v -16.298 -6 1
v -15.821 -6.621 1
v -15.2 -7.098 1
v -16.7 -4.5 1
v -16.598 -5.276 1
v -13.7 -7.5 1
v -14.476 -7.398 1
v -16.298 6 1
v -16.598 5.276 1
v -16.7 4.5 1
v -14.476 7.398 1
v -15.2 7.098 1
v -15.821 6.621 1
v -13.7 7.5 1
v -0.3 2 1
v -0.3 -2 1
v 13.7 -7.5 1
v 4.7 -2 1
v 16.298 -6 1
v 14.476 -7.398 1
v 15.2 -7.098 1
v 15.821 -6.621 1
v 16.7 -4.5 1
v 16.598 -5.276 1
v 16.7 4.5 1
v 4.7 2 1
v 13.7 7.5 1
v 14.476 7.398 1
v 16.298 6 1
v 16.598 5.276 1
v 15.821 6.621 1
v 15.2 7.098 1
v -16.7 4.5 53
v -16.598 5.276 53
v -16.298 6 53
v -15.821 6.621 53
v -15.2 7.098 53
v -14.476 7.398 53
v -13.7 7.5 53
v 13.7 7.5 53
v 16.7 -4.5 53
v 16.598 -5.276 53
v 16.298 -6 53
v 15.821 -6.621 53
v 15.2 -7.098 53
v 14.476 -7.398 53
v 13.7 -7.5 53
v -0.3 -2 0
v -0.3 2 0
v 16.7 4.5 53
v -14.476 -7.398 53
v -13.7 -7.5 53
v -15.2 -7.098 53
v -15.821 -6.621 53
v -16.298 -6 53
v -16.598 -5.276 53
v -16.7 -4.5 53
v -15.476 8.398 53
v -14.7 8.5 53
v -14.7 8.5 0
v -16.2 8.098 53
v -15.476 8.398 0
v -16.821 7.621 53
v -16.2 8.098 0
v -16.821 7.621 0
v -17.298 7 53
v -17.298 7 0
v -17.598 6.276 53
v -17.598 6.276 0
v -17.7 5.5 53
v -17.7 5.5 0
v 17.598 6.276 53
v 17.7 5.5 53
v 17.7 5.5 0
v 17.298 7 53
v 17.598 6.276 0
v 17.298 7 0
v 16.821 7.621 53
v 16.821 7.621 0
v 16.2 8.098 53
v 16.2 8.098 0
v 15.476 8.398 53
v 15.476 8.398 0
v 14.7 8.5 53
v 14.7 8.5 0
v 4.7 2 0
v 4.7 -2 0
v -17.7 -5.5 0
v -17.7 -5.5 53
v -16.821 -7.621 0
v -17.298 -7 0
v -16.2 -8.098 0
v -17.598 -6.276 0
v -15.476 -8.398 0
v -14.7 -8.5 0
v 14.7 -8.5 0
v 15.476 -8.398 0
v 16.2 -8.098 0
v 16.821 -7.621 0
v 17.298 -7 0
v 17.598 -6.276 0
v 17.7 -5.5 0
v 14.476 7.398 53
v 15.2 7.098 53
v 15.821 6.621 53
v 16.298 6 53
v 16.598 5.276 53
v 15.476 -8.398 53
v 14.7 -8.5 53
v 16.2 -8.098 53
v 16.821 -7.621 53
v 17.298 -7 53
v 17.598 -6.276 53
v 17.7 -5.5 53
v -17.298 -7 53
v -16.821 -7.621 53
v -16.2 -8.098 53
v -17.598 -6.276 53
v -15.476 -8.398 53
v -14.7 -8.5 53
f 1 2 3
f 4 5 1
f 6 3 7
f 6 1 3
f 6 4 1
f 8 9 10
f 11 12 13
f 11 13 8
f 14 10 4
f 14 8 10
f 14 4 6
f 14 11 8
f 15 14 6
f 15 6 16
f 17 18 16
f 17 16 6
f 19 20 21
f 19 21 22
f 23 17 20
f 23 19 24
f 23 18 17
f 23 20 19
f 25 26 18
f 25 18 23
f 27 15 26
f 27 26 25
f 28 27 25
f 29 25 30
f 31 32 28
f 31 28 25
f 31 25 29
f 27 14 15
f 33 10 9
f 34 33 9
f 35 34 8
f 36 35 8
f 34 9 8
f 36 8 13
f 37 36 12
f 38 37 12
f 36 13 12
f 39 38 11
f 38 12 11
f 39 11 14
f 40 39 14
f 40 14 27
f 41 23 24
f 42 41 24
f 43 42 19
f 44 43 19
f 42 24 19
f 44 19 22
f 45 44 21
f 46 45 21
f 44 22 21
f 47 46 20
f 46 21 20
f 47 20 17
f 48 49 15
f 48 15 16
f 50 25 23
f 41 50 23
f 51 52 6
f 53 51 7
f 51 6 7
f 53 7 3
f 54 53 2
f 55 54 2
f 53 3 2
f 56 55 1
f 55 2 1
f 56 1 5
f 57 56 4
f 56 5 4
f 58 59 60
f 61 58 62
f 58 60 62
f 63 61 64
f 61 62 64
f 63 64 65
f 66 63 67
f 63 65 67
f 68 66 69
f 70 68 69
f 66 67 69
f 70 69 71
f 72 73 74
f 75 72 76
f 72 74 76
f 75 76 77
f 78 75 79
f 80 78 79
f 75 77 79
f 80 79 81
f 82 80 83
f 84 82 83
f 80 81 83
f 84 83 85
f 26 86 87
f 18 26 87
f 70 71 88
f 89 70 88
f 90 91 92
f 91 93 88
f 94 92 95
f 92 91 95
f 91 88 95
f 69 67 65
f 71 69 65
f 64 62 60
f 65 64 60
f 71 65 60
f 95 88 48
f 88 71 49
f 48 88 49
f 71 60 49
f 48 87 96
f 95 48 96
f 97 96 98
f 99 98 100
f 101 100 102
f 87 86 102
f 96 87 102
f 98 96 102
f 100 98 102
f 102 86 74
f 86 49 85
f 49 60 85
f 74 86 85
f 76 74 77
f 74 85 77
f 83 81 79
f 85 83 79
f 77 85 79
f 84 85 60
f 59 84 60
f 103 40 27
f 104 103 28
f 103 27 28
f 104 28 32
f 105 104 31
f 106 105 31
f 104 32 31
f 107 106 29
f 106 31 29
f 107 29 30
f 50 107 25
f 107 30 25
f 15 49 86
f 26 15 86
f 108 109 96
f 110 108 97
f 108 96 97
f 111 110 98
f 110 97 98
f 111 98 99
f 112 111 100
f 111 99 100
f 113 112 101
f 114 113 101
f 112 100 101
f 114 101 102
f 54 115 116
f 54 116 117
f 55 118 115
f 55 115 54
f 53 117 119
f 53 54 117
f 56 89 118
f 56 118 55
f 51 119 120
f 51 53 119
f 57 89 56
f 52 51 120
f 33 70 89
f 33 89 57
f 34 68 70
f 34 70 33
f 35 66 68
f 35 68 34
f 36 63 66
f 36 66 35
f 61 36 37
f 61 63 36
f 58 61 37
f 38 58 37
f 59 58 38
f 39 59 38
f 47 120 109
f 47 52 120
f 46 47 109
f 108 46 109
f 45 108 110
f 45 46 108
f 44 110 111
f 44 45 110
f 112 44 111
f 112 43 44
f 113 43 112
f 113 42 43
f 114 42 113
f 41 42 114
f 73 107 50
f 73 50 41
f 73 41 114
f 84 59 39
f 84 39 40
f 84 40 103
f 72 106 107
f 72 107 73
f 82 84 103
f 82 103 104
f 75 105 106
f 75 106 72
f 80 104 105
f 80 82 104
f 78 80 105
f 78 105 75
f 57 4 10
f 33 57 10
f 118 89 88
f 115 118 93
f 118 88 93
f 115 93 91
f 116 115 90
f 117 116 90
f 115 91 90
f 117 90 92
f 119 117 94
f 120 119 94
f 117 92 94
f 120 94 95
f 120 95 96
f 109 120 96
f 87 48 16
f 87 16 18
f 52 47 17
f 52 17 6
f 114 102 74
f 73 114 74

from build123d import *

# Parameters (mm, degrees)
F1_DEPTH = 53
F2_DEPTH = 1
F3_W     = 5
F3_H     = 4
F4_DEPTH = 53.001


with BuildPart() as f1:
    # F0 (on Top) → F1 (new body)
    with BuildSketch(Plane.XY):
        with BuildLine():
            Line((-14.7, -8.5), (14.7, -8.5))
            ThreePointArc((14.7, -8.5), (16.82132, -7.62132), (17.7, -5.5))
            Line((17.7, -5.5), (17.7, 5.5))
            ThreePointArc((17.7, 5.5), (16.82132, 7.62132), (14.7, 8.5))
            Line((14.7, 8.5), (-14.7, 8.5))
            ThreePointArc((-14.7, 8.5), (-16.82132, 7.62132), (-17.7, 5.5))
            Line((-17.7, 5.5), (-17.7, -5.5))
            ThreePointArc((-17.7, -5.5), (-16.82132, -7.62132), (-14.7, -8.5))
        make_face()
        with BuildLine():
            Line((-13.7, 7.5), (13.7, 7.5))
            ThreePointArc((13.7, 7.5), (15.82132, 6.62132), (16.7, 4.5))
            Line((16.7, 4.5), (16.7, -4.5))
            ThreePointArc((16.7, -4.5), (15.82132, -6.62132), (13.7, -7.5))
            Line((13.7, -7.5), (-13.7, -7.5))
            ThreePointArc((-13.7, -7.5), (-15.82132, -6.62132), (-16.7, -4.5))
            Line((-16.7, -4.5), (-16.7, 4.5))
            ThreePointArc((-16.7, 4.5), (-15.82132, 6.62132), (-13.7, 7.5))
        make_face(mode=Mode.SUBTRACT)
    extrude(amount=F1_DEPTH)

    # F0 (on Top) → F2 (join)
    with BuildSketch(Plane.XY):
        with BuildLine():
            ThreePointArc((16.7, 4.5), (15.82132, 6.62132), (13.7, 7.5))
            Line((13.7, 7.5), (-13.7, 7.5))
            ThreePointArc((-13.7, 7.5), (-15.82132, 6.62132), (-16.7, 4.5))
            Line((-16.7, 4.5), (-16.7, -4.5))
            ThreePointArc((-16.7, -4.5), (-15.82132, -6.62132), (-13.7, -7.5))
            Line((-13.7, -7.5), (13.7, -7.5))
            ThreePointArc((13.7, -7.5), (15.82132, -6.62132), (16.7, -4.5))
            Line((16.7, -4.5), (16.7, 4.5))
        make_face()
    extrude(amount=F2_DEPTH)

    # F3 (on face) → F4 (cut, through all)
    with BuildSketch(Plane(origin=(0, 0, 0), x_dir=(1, 0, 0), z_dir=(0, 0, -1))):
        with Locations((2.2, 0)):
            Rectangle(F3_W, F3_H)
    extrude(amount=-F4_DEPTH, mode=Mode.SUBTRACT)


solid = f1.part
